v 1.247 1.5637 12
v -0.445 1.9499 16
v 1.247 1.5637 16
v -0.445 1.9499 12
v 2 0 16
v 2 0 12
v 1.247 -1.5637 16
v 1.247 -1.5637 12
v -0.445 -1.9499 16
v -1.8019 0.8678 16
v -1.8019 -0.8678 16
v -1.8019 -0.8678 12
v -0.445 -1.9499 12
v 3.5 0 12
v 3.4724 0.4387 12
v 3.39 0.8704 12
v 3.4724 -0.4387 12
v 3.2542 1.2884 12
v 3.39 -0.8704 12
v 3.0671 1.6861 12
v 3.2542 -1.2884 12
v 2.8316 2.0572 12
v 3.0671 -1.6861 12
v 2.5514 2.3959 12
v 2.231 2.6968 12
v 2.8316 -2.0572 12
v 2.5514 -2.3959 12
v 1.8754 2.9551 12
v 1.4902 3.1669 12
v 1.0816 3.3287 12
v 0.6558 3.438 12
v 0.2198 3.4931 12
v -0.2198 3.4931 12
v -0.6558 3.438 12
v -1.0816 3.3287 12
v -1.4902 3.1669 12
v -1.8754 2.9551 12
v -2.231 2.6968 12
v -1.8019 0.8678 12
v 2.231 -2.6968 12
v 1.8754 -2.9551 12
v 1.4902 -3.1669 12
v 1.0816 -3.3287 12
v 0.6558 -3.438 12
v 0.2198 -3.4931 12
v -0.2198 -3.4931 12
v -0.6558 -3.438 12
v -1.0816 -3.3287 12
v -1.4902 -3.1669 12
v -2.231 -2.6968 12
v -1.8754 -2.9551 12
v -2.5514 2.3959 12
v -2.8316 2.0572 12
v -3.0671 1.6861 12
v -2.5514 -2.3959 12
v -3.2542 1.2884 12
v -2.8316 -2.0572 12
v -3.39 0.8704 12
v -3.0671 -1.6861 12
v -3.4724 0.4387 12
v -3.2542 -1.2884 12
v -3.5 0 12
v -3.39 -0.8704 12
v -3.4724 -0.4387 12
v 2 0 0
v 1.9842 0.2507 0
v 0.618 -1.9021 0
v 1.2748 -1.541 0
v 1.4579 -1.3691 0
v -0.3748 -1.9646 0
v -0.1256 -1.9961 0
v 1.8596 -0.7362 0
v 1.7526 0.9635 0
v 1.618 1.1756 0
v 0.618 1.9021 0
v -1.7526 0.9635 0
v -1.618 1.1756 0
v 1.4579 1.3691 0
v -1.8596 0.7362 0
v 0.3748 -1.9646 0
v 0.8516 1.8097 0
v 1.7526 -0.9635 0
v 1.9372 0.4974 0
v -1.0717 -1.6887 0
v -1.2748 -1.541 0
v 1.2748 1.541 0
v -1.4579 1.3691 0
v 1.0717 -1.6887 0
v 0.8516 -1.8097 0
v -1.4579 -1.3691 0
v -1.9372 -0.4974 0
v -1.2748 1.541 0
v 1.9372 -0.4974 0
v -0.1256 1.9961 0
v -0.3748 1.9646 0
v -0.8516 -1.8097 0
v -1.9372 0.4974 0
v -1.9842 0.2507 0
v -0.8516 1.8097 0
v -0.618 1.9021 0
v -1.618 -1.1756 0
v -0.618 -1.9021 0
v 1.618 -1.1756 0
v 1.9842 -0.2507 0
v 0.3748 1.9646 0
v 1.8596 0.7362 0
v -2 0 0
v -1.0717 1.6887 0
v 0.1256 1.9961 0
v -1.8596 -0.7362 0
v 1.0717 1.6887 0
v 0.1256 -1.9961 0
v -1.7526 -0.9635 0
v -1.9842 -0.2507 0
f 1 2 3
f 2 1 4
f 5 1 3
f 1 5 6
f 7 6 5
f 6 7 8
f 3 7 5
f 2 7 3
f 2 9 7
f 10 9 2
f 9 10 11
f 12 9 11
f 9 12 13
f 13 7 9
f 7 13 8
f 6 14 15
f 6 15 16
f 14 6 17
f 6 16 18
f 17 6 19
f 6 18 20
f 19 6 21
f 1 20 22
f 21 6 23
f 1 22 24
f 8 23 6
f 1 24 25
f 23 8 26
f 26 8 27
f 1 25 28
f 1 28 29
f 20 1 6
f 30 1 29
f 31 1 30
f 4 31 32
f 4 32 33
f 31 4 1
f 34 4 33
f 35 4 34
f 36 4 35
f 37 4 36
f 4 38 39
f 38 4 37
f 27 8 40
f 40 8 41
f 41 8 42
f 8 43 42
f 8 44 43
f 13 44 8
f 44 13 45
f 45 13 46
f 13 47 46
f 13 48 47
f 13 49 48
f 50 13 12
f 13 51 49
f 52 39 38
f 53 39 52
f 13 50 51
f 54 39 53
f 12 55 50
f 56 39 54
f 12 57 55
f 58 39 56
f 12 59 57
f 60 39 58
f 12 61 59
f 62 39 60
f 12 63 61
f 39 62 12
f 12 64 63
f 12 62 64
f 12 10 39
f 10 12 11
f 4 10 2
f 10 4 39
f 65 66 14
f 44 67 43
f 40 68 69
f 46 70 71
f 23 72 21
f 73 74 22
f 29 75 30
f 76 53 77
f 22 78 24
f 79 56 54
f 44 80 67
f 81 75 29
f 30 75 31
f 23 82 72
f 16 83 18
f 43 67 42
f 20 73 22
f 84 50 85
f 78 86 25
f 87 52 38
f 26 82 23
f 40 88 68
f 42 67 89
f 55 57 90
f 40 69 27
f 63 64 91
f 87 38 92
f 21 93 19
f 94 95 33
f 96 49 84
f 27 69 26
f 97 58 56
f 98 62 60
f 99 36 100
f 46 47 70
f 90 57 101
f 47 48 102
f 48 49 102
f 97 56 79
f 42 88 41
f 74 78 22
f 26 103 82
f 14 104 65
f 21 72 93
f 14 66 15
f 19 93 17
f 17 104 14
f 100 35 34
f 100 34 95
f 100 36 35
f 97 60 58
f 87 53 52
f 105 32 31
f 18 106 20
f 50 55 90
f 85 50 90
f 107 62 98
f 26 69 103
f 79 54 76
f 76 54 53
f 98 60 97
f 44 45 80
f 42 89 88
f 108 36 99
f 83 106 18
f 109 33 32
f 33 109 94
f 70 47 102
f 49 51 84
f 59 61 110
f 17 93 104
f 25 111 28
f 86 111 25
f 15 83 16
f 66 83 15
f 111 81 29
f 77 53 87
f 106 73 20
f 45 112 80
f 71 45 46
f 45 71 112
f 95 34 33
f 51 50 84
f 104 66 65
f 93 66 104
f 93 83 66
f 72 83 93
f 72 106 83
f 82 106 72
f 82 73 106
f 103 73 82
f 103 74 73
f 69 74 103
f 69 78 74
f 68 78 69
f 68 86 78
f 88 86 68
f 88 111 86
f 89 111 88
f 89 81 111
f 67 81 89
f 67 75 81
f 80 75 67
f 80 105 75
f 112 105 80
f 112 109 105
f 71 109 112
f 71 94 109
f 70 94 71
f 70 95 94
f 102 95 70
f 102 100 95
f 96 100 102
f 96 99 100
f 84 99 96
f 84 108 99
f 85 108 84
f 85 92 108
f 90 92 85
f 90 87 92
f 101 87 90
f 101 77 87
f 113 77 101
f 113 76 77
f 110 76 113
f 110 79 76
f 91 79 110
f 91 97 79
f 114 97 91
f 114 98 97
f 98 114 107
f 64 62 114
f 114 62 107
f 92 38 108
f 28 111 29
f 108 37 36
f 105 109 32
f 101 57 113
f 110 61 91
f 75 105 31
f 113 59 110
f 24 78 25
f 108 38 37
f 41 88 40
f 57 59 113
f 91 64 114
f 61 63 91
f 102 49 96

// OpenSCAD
DMAX = 3.5;
DMIN = 2;
L = 12;
union(){
    translate([0,0,12])
        cylinder(4,2,2);
    cylinder(L,DMIN,DMAX,$fn=50);
    
};
